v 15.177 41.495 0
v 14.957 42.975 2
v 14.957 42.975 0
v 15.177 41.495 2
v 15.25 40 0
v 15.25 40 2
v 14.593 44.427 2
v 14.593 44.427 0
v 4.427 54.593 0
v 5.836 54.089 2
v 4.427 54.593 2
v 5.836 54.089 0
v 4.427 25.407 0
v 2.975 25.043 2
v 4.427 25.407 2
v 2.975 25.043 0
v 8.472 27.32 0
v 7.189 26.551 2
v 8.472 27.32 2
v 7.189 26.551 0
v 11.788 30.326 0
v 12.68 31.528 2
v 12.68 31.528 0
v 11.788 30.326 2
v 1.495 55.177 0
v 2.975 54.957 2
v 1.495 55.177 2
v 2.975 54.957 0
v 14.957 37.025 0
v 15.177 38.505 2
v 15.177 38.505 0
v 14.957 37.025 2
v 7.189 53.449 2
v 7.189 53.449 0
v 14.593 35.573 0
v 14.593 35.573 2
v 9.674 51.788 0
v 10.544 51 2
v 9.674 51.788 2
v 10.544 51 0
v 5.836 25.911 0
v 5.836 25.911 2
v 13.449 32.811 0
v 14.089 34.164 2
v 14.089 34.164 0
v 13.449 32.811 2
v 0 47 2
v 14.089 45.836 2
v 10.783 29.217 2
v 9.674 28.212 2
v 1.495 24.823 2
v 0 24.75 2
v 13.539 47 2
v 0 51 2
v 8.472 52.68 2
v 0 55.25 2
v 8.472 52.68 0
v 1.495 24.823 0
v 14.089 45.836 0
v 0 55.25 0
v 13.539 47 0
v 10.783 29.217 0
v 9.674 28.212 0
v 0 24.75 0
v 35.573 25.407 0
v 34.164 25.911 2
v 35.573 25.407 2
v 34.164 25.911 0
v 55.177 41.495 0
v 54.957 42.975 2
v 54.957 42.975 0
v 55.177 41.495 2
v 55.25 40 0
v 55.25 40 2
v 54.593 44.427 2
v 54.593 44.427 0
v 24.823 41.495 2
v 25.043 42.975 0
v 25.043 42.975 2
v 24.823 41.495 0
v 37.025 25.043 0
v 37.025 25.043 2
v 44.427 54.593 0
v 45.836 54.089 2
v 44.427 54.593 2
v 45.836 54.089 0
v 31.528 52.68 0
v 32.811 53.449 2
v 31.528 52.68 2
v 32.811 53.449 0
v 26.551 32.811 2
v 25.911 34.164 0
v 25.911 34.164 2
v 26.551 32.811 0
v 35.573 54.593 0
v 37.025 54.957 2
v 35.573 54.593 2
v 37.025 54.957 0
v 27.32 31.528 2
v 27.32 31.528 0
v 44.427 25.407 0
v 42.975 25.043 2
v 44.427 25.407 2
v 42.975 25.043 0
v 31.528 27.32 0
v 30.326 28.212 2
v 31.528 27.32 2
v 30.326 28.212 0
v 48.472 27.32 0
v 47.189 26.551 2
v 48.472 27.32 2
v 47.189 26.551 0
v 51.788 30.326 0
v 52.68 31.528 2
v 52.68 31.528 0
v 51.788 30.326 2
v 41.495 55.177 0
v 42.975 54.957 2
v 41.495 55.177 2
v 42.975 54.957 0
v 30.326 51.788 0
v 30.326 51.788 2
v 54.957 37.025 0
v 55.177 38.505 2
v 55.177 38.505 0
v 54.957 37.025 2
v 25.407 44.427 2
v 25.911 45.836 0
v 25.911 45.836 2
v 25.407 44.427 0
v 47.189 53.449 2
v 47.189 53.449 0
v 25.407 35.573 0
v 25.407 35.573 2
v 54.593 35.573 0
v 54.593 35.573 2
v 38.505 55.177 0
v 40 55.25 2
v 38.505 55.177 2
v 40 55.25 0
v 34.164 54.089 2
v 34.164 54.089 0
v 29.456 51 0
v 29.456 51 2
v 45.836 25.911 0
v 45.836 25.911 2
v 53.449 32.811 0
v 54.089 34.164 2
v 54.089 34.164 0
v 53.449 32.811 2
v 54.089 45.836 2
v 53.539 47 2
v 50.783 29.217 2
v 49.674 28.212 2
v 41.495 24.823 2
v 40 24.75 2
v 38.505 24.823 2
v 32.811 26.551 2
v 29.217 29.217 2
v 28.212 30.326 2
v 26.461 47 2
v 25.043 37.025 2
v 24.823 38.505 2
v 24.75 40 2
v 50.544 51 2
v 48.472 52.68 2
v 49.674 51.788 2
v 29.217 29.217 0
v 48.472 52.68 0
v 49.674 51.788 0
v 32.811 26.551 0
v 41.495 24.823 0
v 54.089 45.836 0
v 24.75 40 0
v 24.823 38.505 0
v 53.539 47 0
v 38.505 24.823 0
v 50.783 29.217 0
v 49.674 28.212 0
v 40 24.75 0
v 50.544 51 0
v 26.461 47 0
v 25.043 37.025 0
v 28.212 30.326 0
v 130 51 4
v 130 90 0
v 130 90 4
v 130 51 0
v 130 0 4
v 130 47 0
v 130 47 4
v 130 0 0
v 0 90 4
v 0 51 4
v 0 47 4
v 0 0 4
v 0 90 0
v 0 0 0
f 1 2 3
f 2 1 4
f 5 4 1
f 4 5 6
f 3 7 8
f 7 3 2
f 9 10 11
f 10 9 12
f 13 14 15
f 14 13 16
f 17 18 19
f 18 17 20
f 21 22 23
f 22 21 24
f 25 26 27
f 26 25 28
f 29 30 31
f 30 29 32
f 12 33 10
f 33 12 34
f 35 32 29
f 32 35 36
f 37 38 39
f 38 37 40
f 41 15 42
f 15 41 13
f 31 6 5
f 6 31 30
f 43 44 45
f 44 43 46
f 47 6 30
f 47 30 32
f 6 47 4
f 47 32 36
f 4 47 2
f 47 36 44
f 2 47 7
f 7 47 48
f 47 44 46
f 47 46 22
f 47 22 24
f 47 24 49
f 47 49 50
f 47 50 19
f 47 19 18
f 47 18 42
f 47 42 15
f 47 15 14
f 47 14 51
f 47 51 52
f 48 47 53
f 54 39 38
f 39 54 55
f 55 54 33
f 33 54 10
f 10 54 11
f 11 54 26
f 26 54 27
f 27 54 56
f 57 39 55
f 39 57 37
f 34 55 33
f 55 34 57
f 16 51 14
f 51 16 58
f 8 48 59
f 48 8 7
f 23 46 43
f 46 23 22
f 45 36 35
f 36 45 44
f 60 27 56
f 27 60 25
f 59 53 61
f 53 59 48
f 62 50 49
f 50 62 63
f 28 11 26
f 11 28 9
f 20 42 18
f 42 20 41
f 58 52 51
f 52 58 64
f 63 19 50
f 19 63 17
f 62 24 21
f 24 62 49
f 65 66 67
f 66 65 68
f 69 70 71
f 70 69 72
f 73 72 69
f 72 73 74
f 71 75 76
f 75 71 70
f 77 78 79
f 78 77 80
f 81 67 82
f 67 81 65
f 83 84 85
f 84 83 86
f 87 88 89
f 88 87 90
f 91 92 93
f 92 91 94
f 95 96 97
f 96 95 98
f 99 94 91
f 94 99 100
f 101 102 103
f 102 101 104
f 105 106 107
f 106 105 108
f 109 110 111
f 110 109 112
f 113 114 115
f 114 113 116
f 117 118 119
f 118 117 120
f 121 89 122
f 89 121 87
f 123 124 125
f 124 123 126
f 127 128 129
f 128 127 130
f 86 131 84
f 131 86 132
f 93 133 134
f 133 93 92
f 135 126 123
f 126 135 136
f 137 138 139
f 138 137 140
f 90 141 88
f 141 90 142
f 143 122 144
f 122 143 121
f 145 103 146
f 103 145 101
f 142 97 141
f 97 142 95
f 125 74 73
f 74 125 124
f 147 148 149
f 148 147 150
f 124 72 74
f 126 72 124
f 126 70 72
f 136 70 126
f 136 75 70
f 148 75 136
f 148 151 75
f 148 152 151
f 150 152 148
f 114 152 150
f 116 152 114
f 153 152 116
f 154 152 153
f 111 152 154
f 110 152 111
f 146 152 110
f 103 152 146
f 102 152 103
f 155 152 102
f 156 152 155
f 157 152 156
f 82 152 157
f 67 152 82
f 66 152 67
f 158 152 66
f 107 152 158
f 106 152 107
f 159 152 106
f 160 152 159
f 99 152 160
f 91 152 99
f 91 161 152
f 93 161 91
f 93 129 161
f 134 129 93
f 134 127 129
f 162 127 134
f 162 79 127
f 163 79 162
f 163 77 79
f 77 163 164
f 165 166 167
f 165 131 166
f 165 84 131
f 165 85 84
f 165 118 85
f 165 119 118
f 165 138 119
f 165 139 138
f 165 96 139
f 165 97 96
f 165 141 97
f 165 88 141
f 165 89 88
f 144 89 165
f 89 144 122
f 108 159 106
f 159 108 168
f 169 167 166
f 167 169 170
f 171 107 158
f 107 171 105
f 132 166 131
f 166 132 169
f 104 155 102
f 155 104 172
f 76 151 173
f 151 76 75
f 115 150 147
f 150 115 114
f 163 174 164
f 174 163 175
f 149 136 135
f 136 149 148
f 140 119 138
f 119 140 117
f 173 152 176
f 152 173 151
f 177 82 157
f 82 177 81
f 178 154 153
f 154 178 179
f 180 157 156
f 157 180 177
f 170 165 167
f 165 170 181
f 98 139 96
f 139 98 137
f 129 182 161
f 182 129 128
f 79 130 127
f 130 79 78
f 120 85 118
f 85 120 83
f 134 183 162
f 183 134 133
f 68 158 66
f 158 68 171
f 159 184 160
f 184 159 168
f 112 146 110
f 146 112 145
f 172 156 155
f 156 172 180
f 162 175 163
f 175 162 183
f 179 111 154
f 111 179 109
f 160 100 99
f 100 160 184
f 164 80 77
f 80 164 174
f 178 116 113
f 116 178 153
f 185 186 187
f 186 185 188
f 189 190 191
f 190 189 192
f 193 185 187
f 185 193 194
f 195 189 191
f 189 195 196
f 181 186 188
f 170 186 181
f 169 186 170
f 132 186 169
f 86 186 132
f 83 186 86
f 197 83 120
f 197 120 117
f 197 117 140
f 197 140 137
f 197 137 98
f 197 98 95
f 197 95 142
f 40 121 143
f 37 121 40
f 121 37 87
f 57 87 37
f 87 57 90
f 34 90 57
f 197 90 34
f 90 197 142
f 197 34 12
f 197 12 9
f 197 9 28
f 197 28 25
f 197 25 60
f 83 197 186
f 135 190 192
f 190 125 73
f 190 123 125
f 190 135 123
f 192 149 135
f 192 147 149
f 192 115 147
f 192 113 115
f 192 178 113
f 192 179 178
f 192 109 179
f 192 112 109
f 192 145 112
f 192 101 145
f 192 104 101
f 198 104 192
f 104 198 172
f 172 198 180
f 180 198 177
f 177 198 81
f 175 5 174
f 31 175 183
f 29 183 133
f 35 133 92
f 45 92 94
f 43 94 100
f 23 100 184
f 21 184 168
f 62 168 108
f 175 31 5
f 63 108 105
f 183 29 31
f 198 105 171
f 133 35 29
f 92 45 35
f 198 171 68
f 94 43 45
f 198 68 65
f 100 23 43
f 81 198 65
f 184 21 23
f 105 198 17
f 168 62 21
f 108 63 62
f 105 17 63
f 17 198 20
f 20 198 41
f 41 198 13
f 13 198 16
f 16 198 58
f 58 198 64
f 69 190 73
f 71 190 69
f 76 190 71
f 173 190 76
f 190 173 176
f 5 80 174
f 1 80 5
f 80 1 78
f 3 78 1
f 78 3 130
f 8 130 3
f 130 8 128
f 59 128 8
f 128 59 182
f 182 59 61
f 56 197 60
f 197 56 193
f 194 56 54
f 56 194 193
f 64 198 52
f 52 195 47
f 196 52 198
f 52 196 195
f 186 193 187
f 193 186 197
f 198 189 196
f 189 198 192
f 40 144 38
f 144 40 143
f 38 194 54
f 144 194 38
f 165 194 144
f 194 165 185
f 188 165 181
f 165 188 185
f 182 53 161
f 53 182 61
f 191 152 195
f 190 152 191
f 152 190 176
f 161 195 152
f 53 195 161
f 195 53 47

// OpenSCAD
// Dimensions (mm)
plate_x = 130;
plate_y = 90;
plate_z = 4;

hole_diameter = 30.5;
hole_radius = hole_diameter / 2;

// Grid layout: 2 rows (Y) x 3 columns (X)
// 40 mm center-to-center spacing
grid_spacing_x = 40;
grid_spacing_y = 40;

// Wall dimensions
wall_length = plate_x;
wall_thickness = 4;
wall_height = 70;

// Quality
$fn = 64;

// Main structure
difference() {
    // Base plate, resting on z=0
    translate([0, 0, 0])
        cube([plate_x, plate_y, plate_z], center = false);

    // Side walls (long edges along X)
    // Left wall (at y = -plate_y/2)
    translate([0, -plate_y/2 - wall_thickness/2, 0])
        cube([wall_length, wall_thickness, wall_height]);

    // Right wall (at y = +plate_y/2)
    translate([0, plate_y/2 + wall_thickness/2, 0])
        cube([wall_length, wall_thickness, wall_height]);

    // Holes: 2 rows (Y) x 3 columns (X)
    // Centers at:
    // X: -40, 0, +40
    // Y: -20, +20
    for (xi = [-1, 0, 1]) {
        for (yi = [-1, 1]) {
            translate([xi * grid_spacing_x, yi * grid_spacing_y, -1])
                cylinder(r = hole_radius, h = plate_z + 2, center = true);
        }
    }
}
